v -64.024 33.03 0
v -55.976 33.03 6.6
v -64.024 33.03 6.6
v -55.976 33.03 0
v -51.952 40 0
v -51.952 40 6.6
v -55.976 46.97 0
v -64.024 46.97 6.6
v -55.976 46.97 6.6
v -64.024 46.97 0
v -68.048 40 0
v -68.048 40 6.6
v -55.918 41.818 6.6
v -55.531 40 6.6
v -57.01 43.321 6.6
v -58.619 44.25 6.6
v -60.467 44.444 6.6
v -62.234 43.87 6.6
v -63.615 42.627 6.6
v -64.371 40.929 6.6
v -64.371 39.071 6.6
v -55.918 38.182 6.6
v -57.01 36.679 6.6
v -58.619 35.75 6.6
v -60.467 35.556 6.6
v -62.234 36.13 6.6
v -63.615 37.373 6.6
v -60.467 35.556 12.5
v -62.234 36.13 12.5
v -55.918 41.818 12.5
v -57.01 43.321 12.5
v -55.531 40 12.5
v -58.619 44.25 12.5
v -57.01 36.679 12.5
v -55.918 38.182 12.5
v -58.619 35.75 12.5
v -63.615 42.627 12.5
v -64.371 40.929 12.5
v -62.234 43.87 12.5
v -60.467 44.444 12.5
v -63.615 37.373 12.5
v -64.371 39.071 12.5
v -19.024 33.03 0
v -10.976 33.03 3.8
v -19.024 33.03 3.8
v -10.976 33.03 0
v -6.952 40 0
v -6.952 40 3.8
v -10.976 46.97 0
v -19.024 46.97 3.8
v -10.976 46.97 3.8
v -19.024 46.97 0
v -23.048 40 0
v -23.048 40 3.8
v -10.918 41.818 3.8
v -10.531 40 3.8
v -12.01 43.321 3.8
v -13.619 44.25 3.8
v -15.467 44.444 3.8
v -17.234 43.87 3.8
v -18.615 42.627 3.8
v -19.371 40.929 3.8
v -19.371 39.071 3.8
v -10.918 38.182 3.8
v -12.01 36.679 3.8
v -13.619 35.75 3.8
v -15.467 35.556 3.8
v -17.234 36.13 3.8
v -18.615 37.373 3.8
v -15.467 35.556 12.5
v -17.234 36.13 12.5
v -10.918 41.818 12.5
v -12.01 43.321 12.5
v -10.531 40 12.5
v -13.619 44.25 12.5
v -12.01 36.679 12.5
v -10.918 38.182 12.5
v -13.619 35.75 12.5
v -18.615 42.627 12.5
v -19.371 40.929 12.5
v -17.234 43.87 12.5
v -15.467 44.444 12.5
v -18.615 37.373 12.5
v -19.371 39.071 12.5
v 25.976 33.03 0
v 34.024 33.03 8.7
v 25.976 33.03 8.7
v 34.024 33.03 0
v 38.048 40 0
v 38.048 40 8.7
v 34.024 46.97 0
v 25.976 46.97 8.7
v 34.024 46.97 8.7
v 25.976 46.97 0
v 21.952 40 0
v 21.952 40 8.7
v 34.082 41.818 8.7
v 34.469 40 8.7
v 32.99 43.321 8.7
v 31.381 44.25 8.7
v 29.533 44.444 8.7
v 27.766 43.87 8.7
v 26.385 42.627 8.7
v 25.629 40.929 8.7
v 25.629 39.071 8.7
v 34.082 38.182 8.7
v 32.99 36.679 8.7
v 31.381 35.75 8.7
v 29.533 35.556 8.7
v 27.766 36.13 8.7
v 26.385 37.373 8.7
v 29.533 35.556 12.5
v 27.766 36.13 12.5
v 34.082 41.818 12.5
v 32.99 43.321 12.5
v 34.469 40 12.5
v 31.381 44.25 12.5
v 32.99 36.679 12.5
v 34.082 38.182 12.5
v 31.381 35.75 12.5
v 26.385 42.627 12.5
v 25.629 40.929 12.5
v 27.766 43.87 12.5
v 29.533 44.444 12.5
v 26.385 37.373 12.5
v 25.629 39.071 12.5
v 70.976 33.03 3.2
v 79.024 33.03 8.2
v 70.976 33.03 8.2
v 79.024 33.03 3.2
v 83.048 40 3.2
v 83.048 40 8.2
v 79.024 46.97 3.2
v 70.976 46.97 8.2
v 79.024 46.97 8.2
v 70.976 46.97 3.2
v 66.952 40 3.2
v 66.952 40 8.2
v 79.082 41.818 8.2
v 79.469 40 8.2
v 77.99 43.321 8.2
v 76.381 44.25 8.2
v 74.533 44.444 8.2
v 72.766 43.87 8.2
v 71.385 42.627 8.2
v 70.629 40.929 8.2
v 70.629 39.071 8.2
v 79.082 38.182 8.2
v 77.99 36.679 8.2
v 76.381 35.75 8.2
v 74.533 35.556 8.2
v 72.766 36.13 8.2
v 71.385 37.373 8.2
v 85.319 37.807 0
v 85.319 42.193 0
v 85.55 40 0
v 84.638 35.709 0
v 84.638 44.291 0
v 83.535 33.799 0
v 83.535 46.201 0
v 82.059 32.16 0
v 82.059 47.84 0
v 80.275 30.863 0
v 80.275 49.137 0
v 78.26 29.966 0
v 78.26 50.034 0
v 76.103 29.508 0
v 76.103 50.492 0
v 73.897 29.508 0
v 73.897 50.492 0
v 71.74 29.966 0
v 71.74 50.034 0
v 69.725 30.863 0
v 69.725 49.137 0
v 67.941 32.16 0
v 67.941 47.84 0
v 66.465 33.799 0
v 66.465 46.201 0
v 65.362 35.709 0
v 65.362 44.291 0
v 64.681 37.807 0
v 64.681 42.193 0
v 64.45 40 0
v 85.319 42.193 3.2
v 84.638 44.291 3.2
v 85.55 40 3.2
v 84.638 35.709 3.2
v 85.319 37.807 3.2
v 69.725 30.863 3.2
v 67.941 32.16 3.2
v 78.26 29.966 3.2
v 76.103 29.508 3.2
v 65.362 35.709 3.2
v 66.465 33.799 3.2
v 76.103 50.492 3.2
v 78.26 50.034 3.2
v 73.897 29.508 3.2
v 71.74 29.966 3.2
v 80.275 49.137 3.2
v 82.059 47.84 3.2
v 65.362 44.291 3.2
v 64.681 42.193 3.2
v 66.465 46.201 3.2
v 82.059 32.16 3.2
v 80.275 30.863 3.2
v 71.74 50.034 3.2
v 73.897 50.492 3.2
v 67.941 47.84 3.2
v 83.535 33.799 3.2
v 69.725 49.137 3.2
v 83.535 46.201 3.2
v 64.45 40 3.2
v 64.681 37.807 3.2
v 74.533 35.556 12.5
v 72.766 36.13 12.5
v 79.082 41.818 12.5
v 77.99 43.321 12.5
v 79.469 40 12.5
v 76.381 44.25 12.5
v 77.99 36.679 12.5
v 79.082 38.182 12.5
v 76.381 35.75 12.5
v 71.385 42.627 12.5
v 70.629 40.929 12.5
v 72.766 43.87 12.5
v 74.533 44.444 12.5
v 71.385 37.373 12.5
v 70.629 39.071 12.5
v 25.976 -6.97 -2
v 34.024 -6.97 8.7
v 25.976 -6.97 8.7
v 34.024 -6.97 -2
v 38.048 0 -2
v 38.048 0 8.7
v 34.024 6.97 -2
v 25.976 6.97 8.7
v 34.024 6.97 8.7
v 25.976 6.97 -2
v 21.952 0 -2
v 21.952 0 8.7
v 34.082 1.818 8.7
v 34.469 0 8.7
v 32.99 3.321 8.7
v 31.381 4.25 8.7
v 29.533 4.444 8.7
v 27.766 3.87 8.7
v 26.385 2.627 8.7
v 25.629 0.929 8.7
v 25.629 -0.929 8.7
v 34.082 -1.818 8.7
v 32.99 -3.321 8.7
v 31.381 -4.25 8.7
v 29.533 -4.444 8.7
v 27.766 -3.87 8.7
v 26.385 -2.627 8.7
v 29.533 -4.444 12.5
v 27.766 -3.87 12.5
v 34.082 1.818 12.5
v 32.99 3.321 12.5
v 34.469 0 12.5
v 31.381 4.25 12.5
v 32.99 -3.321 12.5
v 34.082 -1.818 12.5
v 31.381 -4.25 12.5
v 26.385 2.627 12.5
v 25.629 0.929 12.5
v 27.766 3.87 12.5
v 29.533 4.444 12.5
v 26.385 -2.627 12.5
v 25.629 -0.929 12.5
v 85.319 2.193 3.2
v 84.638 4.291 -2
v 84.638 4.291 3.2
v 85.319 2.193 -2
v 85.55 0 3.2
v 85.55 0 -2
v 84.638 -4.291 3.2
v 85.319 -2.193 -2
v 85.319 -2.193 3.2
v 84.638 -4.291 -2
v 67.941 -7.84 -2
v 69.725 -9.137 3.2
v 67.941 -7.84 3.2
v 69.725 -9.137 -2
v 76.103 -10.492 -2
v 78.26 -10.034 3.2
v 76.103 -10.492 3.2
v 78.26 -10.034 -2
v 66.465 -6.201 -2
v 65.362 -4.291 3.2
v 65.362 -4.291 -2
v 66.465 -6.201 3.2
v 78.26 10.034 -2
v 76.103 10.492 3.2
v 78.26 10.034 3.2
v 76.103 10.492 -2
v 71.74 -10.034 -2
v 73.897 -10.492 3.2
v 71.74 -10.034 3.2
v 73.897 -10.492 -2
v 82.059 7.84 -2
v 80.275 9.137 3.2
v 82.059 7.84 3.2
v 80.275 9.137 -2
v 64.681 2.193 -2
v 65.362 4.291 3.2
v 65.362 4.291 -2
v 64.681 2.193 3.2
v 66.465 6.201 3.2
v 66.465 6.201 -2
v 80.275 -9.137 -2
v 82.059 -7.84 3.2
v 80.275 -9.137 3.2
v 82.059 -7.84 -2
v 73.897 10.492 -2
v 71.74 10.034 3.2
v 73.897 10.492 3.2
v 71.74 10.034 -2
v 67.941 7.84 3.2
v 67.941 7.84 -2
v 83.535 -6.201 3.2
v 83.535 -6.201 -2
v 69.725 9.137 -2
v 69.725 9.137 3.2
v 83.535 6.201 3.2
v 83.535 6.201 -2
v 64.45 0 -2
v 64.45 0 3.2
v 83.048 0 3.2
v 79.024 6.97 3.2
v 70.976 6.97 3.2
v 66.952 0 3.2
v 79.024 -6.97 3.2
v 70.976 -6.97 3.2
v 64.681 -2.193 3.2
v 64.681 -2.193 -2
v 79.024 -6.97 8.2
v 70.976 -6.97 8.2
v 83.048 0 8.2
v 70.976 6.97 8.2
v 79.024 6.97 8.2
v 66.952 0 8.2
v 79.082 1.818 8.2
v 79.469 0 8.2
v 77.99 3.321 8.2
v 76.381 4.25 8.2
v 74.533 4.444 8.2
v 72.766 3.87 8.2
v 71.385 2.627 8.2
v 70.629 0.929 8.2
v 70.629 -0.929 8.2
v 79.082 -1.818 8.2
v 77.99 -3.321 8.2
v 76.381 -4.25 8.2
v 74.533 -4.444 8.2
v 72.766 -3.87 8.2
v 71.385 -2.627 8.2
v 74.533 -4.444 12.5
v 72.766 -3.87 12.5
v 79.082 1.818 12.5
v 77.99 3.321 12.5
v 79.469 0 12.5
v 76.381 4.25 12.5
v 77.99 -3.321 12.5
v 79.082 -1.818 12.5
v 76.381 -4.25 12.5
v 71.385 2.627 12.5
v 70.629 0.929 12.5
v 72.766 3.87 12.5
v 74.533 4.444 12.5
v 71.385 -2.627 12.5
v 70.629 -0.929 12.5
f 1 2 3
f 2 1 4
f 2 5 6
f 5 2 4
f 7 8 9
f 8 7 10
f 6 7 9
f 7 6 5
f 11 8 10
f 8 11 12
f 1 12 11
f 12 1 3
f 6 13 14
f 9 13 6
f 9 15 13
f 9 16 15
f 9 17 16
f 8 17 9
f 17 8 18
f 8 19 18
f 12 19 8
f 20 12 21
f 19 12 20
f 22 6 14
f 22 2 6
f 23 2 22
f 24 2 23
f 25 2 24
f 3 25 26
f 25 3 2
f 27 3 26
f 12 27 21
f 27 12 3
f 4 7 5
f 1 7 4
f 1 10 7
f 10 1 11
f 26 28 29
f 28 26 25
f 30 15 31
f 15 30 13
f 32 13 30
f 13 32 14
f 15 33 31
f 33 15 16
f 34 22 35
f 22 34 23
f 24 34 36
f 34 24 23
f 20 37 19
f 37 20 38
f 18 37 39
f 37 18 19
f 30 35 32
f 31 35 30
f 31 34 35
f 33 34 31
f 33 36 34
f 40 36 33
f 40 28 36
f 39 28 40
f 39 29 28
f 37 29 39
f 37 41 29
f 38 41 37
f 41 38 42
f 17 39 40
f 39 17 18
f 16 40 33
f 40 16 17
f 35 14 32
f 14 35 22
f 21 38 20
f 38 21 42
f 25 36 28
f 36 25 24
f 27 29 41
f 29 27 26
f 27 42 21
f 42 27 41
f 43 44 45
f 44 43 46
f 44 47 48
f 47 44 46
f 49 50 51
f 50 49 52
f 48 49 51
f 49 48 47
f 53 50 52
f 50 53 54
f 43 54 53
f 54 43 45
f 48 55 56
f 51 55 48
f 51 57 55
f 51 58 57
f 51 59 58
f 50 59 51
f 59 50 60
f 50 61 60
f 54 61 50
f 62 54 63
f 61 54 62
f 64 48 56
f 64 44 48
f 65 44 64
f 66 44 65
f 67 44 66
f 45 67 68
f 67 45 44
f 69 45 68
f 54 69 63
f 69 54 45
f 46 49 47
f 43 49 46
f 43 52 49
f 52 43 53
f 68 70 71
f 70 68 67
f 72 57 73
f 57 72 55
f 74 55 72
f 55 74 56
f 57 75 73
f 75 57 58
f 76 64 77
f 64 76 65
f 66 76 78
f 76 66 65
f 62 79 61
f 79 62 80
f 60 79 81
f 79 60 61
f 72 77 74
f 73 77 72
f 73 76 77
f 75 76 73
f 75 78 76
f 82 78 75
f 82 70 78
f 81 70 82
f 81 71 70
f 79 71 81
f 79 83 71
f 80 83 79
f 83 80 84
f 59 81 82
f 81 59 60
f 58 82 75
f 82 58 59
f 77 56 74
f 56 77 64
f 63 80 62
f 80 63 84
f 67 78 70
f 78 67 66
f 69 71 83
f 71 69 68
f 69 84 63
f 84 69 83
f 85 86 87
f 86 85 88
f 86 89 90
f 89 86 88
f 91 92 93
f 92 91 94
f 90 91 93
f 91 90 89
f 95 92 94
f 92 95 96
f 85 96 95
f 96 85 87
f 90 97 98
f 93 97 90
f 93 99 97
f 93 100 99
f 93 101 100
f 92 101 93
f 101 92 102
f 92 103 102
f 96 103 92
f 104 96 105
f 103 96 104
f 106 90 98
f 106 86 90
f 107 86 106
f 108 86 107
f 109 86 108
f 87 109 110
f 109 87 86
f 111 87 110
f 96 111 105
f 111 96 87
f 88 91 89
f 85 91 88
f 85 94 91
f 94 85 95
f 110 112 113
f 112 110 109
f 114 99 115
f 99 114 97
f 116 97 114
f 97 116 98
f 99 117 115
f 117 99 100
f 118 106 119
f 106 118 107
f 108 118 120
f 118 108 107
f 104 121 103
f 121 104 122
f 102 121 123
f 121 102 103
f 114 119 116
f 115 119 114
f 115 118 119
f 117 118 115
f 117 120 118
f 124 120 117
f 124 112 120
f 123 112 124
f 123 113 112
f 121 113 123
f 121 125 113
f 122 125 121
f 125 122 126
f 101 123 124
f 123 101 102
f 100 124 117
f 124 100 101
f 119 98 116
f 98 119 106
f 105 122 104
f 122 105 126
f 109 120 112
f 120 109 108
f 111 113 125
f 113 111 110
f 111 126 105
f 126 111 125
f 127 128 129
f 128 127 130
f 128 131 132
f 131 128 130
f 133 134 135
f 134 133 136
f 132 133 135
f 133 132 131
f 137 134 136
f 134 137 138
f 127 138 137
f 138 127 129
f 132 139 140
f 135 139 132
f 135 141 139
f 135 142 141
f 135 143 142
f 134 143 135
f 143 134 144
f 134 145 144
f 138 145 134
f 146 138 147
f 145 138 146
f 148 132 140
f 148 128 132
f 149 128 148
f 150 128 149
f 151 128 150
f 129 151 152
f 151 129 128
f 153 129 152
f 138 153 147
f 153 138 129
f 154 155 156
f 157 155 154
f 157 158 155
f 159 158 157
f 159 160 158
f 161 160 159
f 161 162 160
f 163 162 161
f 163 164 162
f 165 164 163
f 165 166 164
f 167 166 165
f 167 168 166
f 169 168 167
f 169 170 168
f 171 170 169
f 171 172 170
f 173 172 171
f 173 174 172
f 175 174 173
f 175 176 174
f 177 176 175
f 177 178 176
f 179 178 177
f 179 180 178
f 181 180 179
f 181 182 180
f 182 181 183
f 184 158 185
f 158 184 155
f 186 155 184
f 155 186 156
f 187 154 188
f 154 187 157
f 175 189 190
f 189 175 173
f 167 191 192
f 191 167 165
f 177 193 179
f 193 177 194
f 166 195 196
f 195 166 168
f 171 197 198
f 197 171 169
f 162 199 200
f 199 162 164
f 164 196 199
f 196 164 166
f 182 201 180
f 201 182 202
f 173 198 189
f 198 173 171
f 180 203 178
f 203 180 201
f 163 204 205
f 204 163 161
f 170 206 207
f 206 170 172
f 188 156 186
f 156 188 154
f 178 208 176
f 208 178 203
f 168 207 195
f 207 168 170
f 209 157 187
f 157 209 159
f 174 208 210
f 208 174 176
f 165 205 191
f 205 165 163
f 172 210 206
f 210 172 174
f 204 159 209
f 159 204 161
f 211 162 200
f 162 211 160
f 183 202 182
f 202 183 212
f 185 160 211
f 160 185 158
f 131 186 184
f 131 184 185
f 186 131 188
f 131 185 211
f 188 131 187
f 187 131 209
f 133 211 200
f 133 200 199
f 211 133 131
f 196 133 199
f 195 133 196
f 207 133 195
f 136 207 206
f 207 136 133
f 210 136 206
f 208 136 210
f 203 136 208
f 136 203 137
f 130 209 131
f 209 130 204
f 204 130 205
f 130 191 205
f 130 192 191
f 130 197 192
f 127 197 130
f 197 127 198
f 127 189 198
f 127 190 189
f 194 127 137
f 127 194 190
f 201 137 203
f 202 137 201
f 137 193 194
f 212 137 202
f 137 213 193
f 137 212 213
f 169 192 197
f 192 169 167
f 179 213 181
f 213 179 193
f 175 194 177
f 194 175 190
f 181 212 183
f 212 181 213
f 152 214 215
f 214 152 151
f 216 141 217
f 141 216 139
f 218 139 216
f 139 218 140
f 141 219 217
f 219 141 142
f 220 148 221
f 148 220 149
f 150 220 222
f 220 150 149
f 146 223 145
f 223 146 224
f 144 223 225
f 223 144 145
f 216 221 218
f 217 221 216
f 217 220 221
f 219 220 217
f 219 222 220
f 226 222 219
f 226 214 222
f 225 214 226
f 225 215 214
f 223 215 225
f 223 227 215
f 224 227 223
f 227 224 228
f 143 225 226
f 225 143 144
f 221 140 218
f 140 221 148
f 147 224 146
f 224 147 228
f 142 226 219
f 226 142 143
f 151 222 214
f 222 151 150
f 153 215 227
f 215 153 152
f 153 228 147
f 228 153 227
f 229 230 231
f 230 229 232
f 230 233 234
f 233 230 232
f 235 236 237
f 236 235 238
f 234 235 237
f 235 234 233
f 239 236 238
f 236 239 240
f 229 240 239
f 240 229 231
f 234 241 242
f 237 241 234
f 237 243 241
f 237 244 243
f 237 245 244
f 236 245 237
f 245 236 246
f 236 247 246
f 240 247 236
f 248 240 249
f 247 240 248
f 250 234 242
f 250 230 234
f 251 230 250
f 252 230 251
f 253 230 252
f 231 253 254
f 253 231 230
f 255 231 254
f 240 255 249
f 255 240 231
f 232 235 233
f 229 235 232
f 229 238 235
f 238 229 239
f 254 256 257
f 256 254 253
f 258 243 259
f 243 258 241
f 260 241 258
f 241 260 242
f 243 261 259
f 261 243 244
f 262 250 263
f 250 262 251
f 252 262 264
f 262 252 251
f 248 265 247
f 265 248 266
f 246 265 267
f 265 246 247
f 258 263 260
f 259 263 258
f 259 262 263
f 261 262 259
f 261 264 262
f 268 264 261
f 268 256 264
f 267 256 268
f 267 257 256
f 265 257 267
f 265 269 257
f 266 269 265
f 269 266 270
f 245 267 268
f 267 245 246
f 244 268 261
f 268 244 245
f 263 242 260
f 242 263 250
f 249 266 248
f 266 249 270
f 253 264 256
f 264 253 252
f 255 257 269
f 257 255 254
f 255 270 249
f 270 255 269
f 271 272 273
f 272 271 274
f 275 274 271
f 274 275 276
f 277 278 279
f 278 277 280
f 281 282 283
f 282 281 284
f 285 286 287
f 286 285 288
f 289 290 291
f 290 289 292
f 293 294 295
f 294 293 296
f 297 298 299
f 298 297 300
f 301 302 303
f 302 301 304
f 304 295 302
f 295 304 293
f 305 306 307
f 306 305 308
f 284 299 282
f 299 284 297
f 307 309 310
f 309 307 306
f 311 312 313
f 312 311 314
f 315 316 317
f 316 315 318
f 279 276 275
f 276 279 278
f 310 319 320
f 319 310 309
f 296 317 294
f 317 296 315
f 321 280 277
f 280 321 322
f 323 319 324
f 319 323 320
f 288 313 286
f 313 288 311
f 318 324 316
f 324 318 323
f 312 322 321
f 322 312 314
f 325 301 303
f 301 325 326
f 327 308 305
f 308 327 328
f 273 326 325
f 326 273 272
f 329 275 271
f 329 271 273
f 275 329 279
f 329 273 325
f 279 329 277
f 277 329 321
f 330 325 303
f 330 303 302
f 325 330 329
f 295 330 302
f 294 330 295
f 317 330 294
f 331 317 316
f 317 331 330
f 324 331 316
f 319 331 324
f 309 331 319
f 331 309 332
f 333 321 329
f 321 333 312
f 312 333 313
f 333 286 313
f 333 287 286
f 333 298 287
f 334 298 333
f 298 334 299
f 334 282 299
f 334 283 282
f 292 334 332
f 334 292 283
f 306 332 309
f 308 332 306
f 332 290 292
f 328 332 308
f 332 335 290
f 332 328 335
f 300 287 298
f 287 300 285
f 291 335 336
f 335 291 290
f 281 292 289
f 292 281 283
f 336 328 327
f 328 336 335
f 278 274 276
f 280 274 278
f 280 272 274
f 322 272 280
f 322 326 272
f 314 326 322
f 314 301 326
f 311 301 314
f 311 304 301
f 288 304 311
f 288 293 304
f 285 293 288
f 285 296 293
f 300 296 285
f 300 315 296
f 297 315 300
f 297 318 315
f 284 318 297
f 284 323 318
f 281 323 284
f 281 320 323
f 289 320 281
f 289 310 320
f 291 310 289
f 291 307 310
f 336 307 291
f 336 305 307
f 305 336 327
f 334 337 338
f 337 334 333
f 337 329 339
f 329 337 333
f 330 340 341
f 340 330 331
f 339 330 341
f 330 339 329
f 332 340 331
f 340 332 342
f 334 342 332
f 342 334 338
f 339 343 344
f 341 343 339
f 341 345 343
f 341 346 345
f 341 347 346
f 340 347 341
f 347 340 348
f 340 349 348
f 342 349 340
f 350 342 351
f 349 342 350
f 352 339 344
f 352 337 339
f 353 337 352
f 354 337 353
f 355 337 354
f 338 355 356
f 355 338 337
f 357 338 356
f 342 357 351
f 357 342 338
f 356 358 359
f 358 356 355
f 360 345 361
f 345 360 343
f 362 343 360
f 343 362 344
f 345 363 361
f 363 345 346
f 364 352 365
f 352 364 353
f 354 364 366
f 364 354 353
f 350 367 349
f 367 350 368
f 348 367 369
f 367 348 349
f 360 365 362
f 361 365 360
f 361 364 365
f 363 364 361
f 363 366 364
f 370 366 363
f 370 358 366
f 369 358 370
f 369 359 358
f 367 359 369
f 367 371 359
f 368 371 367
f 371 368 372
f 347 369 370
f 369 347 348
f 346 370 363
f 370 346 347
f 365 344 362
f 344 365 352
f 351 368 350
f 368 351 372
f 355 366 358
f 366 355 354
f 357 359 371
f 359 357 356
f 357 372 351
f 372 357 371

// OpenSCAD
// =====================================================
// CALCULADORA - TUERCAS WHITWORTH (BSW / BS 1083)
// El diámetro de rosca se ingresa en PULGADAS (decimal)
// Valores de referencia - verificar norma BS 1083 exacta
// si es crítico (no tan estandarizada públicamente como
// DIN/ISO para las variantes delgada/autoblocante/brida)
// =====================================================
PULGADA2 = 25.4;
function pulg_a_mm2(p) = p * PULGADA2;

// -----------------------------------------------------
// Tuerca hexagonal NORMAL (BS 1083)
// [ancho_entre_caras_mm, espesor_mm]
// -----------------------------------------------------
function tuerca_whitworth_normal(D_pulg) =
    D_pulg <= 1/8  ? [7.92,  2.4]  :
    D_pulg <= 3/16 ? [9.52,  3.2]  :
    D_pulg <= 1/4  ? [11.30, 5.1]  :
    D_pulg <= 5/16 ? [13.34, 6.4]  :
    D_pulg <= 3/8  ? [15.24, 7.9]  :
    D_pulg <= 7/16 ? [18.03, 9.2]  :
    D_pulg <= 1/2  ? [20.65, 10.3] :
    D_pulg <= 5/8  ? [25.65, 12.7] :
    D_pulg <= 3/4  ? [30.61, 15.5] :
    [pulg_a_mm2(D_pulg) * 1.8, pulg_a_mm2(D_pulg) * 0.9];

// -----------------------------------------------------
// Tuerca hexagonal DELGADA/JAM (aprox., mismo ancho caras,
// espesor reducido ~55-60% de la normal)
// -----------------------------------------------------
function tuerca_whitworth_delgada(D_pulg) =
    D_pulg <= 1/8  ? [7.92,  1.6]  :
    D_pulg <= 3/16 ? [9.52,  2.0]  :
    D_pulg <= 1/4  ? [11.30, 3.0]  :
    D_pulg <= 5/16 ? [13.34, 3.6]  :
    D_pulg <= 3/8  ? [15.24, 4.5]  :
    D_pulg <= 7/16 ? [18.03, 5.2]  :
    D_pulg <= 1/2  ? [20.65, 5.8]  :
    D_pulg <= 5/8  ? [25.65, 7.1]  :
    D_pulg <= 3/4  ? [30.61, 8.7]  :
    [pulg_a_mm2(D_pulg) * 1.8, pulg_a_mm2(D_pulg) * 0.5];

// -----------------------------------------------------
// Tuerca AUTOBLOCANTE con nylon (aprox., más alta que la
// normal por el inserto). Valores de REFERENCIA.
// -----------------------------------------------------
function tuerca_whitworth_nylon(D_pulg) =
    D_pulg <= 1/8  ? [7.92,  4.0]  :
    D_pulg <= 3/16 ? [9.52,  4.8]  :
    D_pulg <= 1/4  ? [11.30, 7.0]  :
    D_pulg <= 5/16 ? [13.34, 8.5]  :
    D_pulg <= 3/8  ? [15.24, 10.3] :
    D_pulg <= 7/16 ? [18.03, 11.9] :
    D_pulg <= 1/2  ? [20.65, 13.3] :
    D_pulg <= 5/8  ? [25.65, 16.4] :
    [pulg_a_mm2(D_pulg) * 1.8, pulg_a_mm2(D_pulg) * 1.4];

// -----------------------------------------------------
// Tuerca CON BRIDA (aprox., no muy común en Whitworth
// original, pero se ofrece por consistencia)
// [ancho_entre_caras, espesor, diametro_brida]
// -----------------------------------------------------
function tuerca_whitworth_brida(D_pulg) =
    D_pulg <= 3/16 ? [9.52,  4.8,  15.0] :
    D_pulg <= 1/4  ? [11.30, 7.0,  17.5] :
    D_pulg <= 5/16 ? [13.34, 8.0,  20.5] :
    D_pulg <= 3/8  ? [15.24, 9.0,  23.5] :
    D_pulg <= 1/2  ? [20.65, 12.5, 30.0] :
    [pulg_a_mm2(D_pulg) * 1.8, pulg_a_mm2(D_pulg) * 1.0, pulg_a_mm2(D_pulg) * 3.9];

// -----------------------------------------------------
// FUNCIÓN SELECTORA GENERAL
// Devuelve siempre [ancho_caras, espesor, diametro_brida]
// -----------------------------------------------------
function tuerca_whitworth(D_pulg, tipo = "normal") =
    tipo == "normal"       ? [tuerca_whitworth_normal(D_pulg)[0],  tuerca_whitworth_normal(D_pulg)[1],  0] :
    tipo == "delgada"      ? [tuerca_whitworth_delgada(D_pulg)[0], tuerca_whitworth_delgada(D_pulg)[1], 0] :
    tipo == "autoblocante" ? [tuerca_whitworth_nylon(D_pulg)[0],   tuerca_whitworth_nylon(D_pulg)[1],   0] :
    tipo == "brida"        ? tuerca_whitworth_brida(D_pulg) :
    [tuerca_whitworth_normal(D_pulg)[0], tuerca_whitworth_normal(D_pulg)[1], 0];

// =====================================================
// MÓDULO: BOLSILLO HEXAGONAL PARA TUERCA
// =====================================================
module bolsillo_tuerca_whitworth(
    diametro_rosca_pulg,
    tipo = "normal",
    profundidad_bolsillo = -1,   // -1 = usar espesor estándar según norma
    holgura = 0.3,
    holgura_altura = 0.2,
    alivio=0
) {
    datos = tuerca_whitworth(diametro_rosca_pulg, tipo);
    ancho_caras = datos[0];
    espesor_estandar = datos[1];

    profundidad_real = profundidad_bolsillo < 0 ? espesor_estandar : profundidad_bolsillo;
    radio_hex = (ancho_caras/2 + holgura) / cos(30);

    translate([0, 0, 0])
        cylinder(h = profundidad_real + holgura_altura,
                 r = radio_hex,
                 $fn = 6);

    if (tipo == "brida" && datos[2] > 0) {
        translate([0, 0, 0])
            cylinder(h = profundidad_real * 0.4,
                     r = (datos[2]/2) + holgura);
          if(alivio>0){
        translate([ 0, 0,-alivio])
         color("#AA00AAAA")cylinder(h = alivio,
                     r = (datos[2]/2) + holgura);
         }
     }else if(alivio>0){
     translate([ 0, 0,-alivio])

      color("#AA00AAAA")cylinder(h=alivio,r=radio_hex,$fn = 6);
     }
}

// =====================================================
// MÓDULO: AGUJERO PASANTE PARA EL VÁSTAGO
// =====================================================
module agujero_pasante_tuerca_whitworth(
    diametro_rosca_pulg,
    profundidad,
    profundidad_bolsillo = 0,
    holgura = 0.5,
    profundidad_abs = true
) {
    diametro_rosca_mm = pulg_a_mm2(diametro_rosca_pulg);

    if (profundidad_abs)
        translate([0, 0, profundidad_bolsillo])
            cylinder(h = profundidad - profundidad_bolsillo,
                     r = (diametro_rosca_mm/2) + holgura);
    else
        translate([0, 0, profundidad_bolsillo])
            cylinder(h = profundidad,
                     r = (diametro_rosca_mm/2) + holgura);
}

// =====================================================
// MÓDULO COMBINADO: TUERCA EMBUTIDA + AGUJERO PASANTE
// profundidad_pieza OBLIGATORIO (para booleanos reales)
// profundidad_bolsillo OPCIONAL (default = norma)
// =====================================================
module agujero_con_tuerca_whitworth(
    diametro_rosca_pulg,
    profundidad_pieza,             // OBLIGATORIO: espesor real de la pieza
    tipo = "normal",                 // "normal" | "delgada" | "autoblocante" | "brida"
    profundidad_bolsillo = -1,       // -1 = usar espesor estándar de la tabla
    holgura_tuerca = 0.3,
    holgura_pasante = 0.5,
    holgura_altura = 0.2,
    margen_corte = 0.5,               // sobresalto para evitar z-fighting
    profundidad_abs = true,
    alivio=0
) {
    datos = tuerca_whitworth(diametro_rosca_pulg, tipo);
    espesor_estandar = datos[1];

    bolsillo_real = profundidad_bolsillo < 0 ? espesor_estandar : profundidad_bolsillo;

    bolsillo_tuerca_whitworth(
        diametro_rosca_pulg = diametro_rosca_pulg,
        tipo = tipo,
        profundidad_bolsillo = bolsillo_real,
        holgura = holgura_tuerca,
        holgura_altura = holgura_altura,
        alivio=alivio
    );

    agujero_pasante_tuerca_whitworth(
        diametro_rosca_pulg = diametro_rosca_pulg,
        profundidad = profundidad_pieza + margen_corte,
        profundidad_bolsillo = bolsillo_real,
        holgura = holgura_pasante,
        profundidad_abs = profundidad_abs
    );
}

// Utilidades
function ancho_caras_tuerca(D_pulg, tipo = "normal") = tuerca_whitworth(D_pulg, tipo)[0];
function espesor_tuerca(D_pulg, tipo = "normal") = tuerca_whitworth(D_pulg, tipo)[1];

// =====================================================
// EJEMPLOS CON CASOS CONCRETOS - tuerca_whitworth(D, tipo)
// =====================================================
espesor_pieza2 = 12;
echo("5/16 normal:", tuerca_whitworth(5/16, "normal"));
translate([-60, 40, 0])
    agujero_con_tuerca_whitworth(5/16, profundidad_pieza = 12, tipo="normal");

echo("5/16 delgada:", tuerca_whitworth(5/16, "delgada"));
translate([-15, 40, 0])
    agujero_con_tuerca_whitworth(5/16, profundidad_pieza = 12, tipo="delgada");

echo("5/16 autoblocante:", tuerca_whitworth(5/16, "autoblocante"));
translate([30, 40, 0])
    agujero_con_tuerca_whitworth(5/16, profundidad_pieza = 12, tipo="autoblocante");

echo("5/16 brida:", tuerca_whitworth(5/16, "brida"));
translate([75, 40, 0])
    agujero_con_tuerca_whitworth(5/16, profundidad_pieza = 12, tipo="brida");
    
    
    
echo("5/16 autoblocante:", tuerca_whitworth(5/16, "autoblocante"));
translate([30, 0, 0])
    agujero_con_tuerca_whitworth(5/16, profundidad_pieza = 12, tipo="autoblocante",alivio=2);

echo("5/16 brida:", tuerca_whitworth(5/16, "brida"));
translate([75, 0, 0])
    agujero_con_tuerca_whitworth(5/16, profundidad_pieza = 12, tipo="brida",alivio=2);
